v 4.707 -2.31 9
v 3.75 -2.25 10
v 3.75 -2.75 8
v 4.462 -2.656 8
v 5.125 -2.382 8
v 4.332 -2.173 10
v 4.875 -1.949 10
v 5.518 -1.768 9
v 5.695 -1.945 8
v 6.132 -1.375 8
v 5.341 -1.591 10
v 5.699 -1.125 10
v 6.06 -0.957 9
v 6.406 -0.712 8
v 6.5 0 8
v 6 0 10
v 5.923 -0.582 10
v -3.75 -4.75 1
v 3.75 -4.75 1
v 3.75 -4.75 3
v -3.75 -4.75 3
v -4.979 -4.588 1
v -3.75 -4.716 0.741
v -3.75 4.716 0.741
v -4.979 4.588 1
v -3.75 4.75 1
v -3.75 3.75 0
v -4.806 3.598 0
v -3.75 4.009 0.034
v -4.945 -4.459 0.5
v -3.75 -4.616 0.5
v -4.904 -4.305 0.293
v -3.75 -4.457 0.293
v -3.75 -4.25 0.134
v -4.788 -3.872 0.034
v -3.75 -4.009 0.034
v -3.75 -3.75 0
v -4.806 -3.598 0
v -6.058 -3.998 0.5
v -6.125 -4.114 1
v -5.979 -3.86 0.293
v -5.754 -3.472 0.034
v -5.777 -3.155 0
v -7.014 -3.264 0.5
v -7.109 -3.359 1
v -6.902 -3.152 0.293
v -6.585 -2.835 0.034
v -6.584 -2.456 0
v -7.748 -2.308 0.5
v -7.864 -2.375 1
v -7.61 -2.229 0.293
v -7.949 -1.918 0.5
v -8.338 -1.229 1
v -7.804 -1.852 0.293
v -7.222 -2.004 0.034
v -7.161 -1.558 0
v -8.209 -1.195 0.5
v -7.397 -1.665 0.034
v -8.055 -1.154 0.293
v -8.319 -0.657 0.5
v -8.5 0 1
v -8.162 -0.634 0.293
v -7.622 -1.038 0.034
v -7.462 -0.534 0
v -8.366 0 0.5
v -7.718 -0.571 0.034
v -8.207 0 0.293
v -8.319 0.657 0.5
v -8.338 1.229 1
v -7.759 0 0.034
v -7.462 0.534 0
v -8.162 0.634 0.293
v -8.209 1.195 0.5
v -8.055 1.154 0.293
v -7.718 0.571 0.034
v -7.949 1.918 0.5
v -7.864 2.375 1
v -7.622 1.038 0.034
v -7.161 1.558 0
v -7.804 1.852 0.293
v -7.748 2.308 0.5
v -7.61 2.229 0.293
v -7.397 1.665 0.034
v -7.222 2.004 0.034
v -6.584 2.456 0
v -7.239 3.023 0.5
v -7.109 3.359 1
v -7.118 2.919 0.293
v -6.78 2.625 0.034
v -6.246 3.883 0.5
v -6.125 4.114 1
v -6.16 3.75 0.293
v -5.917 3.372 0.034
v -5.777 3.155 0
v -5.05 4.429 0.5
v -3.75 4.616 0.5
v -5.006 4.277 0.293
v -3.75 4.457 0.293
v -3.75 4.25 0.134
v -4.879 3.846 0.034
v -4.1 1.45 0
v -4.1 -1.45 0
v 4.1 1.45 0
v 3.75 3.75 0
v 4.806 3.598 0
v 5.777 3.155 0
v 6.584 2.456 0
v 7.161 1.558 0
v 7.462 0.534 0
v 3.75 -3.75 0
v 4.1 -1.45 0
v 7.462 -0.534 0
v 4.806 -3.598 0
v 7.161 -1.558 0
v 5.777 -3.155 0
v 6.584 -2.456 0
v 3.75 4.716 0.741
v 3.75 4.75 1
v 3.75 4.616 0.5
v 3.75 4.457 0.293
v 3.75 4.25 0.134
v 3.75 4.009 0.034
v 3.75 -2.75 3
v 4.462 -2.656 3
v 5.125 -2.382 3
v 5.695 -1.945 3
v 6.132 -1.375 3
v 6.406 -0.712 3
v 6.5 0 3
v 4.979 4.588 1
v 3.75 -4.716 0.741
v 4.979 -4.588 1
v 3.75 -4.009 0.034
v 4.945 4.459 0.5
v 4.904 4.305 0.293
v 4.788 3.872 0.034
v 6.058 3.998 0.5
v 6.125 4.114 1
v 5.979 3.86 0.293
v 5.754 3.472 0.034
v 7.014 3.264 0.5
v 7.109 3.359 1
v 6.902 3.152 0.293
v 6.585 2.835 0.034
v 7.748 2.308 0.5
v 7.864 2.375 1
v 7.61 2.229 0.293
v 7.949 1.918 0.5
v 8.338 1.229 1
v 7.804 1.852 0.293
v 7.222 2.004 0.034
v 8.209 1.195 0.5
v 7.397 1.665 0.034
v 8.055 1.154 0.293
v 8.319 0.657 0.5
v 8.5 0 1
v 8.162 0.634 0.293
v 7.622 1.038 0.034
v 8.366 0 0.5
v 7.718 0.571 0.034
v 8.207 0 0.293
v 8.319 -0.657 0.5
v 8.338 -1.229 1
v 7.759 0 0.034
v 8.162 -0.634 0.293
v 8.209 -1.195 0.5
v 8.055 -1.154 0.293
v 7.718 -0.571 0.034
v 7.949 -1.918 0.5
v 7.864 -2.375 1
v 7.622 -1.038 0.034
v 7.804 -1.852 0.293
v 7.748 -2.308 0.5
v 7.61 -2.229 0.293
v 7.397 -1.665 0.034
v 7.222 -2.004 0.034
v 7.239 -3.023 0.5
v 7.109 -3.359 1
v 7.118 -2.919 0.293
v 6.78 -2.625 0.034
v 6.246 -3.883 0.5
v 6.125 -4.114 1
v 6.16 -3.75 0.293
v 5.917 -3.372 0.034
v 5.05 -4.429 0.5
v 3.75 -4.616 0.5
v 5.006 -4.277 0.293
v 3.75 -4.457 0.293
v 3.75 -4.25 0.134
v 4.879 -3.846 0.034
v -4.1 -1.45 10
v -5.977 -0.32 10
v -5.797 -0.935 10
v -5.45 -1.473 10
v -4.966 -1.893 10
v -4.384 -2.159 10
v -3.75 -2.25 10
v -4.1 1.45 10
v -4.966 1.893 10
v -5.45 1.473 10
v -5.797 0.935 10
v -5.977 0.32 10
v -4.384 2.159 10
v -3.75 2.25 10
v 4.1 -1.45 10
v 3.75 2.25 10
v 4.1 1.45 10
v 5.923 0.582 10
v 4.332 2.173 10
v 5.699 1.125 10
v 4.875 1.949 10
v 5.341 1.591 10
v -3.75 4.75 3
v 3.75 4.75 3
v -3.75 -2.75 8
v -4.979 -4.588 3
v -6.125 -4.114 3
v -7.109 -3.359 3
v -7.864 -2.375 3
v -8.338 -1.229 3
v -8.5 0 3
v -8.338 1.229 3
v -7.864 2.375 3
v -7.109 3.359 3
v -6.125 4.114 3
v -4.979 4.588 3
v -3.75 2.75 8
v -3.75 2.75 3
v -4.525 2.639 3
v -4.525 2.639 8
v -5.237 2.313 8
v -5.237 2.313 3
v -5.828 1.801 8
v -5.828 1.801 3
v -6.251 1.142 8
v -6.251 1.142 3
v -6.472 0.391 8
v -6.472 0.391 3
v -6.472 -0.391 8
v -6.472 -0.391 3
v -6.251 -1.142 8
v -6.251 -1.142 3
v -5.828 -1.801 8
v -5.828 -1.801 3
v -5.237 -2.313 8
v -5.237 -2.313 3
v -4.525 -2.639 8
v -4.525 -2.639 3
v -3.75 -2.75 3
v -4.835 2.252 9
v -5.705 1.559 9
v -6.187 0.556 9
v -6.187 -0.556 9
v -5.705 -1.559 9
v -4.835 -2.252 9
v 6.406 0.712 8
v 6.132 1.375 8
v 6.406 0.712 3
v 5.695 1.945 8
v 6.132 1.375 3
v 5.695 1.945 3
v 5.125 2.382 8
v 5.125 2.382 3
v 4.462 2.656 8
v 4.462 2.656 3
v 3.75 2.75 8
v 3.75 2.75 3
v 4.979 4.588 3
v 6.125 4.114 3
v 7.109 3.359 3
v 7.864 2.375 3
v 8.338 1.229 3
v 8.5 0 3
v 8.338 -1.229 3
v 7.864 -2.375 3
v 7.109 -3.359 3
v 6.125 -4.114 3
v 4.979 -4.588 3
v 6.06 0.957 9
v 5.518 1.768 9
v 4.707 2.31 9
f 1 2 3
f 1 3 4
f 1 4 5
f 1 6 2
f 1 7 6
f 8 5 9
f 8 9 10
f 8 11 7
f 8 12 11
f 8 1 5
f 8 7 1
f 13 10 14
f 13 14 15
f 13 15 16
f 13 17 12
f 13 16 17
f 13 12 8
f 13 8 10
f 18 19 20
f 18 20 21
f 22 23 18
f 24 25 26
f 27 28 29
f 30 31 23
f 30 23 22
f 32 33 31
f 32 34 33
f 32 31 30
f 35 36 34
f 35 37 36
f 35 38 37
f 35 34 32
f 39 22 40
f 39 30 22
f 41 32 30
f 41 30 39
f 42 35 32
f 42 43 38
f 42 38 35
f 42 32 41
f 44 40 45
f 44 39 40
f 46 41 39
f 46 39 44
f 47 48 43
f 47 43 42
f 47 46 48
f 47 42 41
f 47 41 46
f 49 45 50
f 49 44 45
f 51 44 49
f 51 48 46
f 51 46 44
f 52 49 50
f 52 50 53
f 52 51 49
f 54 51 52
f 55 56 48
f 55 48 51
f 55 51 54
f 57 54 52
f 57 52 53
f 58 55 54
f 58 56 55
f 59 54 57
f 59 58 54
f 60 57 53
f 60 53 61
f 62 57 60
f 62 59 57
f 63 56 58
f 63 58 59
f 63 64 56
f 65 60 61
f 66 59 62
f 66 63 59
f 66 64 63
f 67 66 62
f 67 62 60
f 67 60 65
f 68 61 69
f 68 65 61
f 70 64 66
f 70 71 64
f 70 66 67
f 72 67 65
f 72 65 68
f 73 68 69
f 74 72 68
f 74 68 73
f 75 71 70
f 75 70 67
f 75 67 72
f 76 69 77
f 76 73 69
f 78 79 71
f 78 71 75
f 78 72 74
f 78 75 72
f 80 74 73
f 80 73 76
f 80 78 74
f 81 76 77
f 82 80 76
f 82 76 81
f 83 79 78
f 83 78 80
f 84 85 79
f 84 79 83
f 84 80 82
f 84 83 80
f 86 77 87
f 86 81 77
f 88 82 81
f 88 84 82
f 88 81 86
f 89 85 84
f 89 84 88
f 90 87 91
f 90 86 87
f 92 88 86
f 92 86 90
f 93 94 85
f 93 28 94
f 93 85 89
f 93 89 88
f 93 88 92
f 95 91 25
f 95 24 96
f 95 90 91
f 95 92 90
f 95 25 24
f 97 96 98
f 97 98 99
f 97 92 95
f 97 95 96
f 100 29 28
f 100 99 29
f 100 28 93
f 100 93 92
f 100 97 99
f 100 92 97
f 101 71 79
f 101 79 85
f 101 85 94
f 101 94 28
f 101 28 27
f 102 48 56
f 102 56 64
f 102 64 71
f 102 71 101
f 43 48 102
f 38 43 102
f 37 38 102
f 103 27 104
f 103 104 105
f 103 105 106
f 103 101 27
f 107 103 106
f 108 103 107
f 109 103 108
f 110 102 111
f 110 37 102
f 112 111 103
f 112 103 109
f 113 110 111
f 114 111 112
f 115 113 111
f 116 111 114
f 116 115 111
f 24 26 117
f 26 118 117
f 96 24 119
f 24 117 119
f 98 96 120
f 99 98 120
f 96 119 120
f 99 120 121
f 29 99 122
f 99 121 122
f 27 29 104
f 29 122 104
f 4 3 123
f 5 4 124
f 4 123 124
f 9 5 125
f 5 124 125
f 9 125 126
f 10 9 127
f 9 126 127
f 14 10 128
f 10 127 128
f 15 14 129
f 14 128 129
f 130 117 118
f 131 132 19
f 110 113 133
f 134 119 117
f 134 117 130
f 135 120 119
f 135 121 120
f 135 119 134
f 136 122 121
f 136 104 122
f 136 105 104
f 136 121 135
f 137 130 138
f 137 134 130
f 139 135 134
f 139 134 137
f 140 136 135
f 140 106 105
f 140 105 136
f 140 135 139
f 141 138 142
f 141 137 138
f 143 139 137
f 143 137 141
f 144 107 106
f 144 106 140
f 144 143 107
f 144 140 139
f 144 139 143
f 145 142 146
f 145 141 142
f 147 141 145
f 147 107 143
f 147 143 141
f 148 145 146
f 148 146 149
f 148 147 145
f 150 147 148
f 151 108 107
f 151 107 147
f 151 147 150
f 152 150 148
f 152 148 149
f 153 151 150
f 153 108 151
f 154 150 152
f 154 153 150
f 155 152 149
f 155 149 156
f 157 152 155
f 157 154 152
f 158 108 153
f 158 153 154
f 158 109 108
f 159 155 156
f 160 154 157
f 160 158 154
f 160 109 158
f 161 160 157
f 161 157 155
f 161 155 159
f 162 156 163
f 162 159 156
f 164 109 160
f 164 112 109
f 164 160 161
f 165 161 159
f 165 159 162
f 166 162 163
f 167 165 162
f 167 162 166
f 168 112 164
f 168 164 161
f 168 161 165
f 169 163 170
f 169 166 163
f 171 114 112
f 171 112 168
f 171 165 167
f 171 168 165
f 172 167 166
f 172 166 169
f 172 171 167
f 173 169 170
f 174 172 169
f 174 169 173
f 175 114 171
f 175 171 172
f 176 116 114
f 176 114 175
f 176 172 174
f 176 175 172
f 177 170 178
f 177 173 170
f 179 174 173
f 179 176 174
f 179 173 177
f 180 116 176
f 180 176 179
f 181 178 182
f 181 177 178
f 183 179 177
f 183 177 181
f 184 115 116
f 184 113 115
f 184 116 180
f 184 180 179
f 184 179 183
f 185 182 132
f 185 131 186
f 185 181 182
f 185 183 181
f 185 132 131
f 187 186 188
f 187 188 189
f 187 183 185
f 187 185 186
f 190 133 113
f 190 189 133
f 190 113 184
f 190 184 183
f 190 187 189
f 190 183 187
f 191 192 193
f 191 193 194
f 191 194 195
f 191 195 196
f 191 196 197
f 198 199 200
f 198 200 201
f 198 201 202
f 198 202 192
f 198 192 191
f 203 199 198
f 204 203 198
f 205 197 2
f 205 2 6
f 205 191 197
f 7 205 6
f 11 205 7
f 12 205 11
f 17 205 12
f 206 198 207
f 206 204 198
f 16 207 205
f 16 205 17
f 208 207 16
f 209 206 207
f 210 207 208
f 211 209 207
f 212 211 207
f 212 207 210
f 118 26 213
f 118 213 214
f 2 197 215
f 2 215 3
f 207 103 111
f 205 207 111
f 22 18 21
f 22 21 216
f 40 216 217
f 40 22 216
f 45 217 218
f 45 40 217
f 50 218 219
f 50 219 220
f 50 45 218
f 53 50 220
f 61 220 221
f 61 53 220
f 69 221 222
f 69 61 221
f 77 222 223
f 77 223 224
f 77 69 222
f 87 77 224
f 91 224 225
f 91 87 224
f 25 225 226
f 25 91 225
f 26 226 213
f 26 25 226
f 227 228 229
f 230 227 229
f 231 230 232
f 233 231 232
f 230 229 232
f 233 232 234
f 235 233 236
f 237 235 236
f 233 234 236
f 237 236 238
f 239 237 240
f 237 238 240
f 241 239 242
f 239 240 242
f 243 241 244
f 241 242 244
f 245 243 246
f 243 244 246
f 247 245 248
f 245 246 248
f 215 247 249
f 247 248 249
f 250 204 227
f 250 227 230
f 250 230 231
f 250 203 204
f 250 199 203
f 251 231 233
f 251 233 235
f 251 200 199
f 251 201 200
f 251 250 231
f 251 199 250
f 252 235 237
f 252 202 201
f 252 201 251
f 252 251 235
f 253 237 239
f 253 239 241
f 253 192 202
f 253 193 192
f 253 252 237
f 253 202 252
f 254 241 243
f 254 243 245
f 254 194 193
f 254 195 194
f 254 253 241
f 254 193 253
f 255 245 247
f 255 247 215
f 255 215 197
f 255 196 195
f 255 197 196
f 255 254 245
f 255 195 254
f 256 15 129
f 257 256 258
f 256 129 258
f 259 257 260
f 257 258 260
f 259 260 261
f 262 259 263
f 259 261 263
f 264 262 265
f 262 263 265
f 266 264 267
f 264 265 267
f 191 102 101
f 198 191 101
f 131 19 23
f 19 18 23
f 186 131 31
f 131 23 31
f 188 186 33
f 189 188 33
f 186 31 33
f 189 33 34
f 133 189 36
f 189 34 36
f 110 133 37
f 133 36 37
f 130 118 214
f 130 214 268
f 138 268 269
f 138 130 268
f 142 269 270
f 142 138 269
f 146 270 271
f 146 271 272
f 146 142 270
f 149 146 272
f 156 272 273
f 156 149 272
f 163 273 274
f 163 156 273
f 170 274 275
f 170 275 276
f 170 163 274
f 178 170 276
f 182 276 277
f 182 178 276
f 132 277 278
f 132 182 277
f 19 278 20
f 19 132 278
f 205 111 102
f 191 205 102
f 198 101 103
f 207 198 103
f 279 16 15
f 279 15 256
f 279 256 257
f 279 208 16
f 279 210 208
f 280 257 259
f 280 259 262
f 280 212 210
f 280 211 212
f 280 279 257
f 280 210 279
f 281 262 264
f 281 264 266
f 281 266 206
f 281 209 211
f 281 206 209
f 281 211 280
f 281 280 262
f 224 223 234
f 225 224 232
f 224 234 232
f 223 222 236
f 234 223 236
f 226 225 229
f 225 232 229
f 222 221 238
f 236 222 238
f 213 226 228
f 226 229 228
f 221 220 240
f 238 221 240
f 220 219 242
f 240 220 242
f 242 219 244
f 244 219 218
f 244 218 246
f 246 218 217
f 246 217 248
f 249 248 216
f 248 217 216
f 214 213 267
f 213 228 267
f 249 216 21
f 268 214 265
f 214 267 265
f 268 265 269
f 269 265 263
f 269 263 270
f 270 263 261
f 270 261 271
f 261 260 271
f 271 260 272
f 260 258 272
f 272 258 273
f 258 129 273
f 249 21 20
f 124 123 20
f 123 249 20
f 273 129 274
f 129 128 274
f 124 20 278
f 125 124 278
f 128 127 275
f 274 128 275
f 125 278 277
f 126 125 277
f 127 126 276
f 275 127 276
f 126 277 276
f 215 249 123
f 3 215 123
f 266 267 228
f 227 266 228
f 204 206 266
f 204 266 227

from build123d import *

# Parameters (mm, degrees)
F1_DEPTH = 10
F2_SIZE2 = 0.5
F2_SIZE  = 2
F4_DEPTH = 3
F5_R     = 1


with BuildPart() as f1:
    # F0 (on Top) → F1 (new body)
    with BuildSketch(Plane.XY):
        with BuildLine():
            Line((3.75, 2.75), (-3.75, 2.75))
            ThreePointArc((-3.75, 2.75), (-2.4130258043, 2.4031229681), (-1.4133357109, 1.45))
            Line((-1.4133357109, 1.45), (1.4133357109, 1.45))
            ThreePointArc((1.4133357109, 1.45), (2.4130258043, 2.4031229681), (3.75, 2.75))
        make_face()
        with BuildLine():
            ThreePointArc((-1.4133357109, 1.45), (-2.4130258043, 2.4031229681), (-3.75, 2.75))
            ThreePointArc((-3.75, 2.75), (-6.5, 0), (-3.75, -2.75))
            ThreePointArc((-3.75, -2.75), (-2.4130258043, -2.4031229681), (-1.4133357109, -1.45))
            Line((-1.4133357109, -1.45), (-4.1, -1.45))
            Line((-4.1, -1.45), (-4.1, 1.45))
            Line((-4.1, 1.45), (-1.4133357109, 1.45))
        make_face()
        with BuildLine():
            ThreePointArc((6.5, 0), (5.6945436483, 1.9445436483), (3.75, 2.75))
            ThreePointArc((3.75, 2.75), (2.4130258043, 2.4031229681), (1.4133357109, 1.45))
            Line((1.4133357109, 1.45), (4.1, 1.45))
            Line((4.1, 1.45), (4.1, -1.45))
            Line((4.1, -1.45), (1.4133357109, -1.45))
            ThreePointArc((1.4133357109, -1.45), (2.4130258043, -2.4031229681), (3.75, -2.75))
            ThreePointArc((3.75, -2.75), (5.6945436483, -1.9445436483), (6.5, 0))
        make_face()
        with BuildLine():
            ThreePointArc((-1.4133357109, -1.45), (-2.4130258043, -2.4031229681), (-3.75, -2.75))
            Line((-3.75, -2.75), (3.75, -2.75))
            ThreePointArc((3.75, -2.75), (2.4130258043, -2.4031229681), (1.4133357109, -1.45))
            Line((1.4133357109, -1.45), (-1.4133357109, -1.45))
        make_face()
    extrude(amount=F1_DEPTH)

    # F2
    f2_edges = [f1.edges().sort_by_distance(p)[0] for p in [
        (0, -2.75, 10),
    ]]
    f2_side = f1.faces().sort_by_distance((0, -2.75, 5))[0]
    chamfer(f2_edges, length=F2_SIZE, length2=F2_SIZE2, reference=f2_side)

    # F3 (on face) → F4 (join)
    with BuildSketch(Plane(origin=(0, 0, 0), x_dir=(1, 0, 0), z_dir=(0, 0, -1))):
        with BuildLine():
            ThreePointArc((3.75, -4.75), (8.5, 0), (3.75, 4.75))
            Line((3.75, 4.75), (-3.75, 4.75))
            ThreePointArc((-3.75, 4.75), (-8.5, 0), (-3.75, -4.75))
            Line((-3.75, -4.75), (3.75, -4.75))
        make_face()
        with BuildLine():
            Line((3.75, -2.75), (-3.75, -2.75))
            ThreePointArc((-3.75, -2.75), (-6.5, 0), (-3.75, 2.75))
            Line((-3.75, 2.75), (3.75, 2.75))
            ThreePointArc((3.75, 2.75), (6.5, 0), (3.75, -2.75))
        make_face(mode=Mode.SUBTRACT)
    extrude(amount=-F4_DEPTH)

    # F5
    f5_edges = [f1.edges().sort_by_distance(p)[0] for p in [
        (0, -4.75, 0),
        (8.5, 0, 0),
        (0, 4.75, 0),
    ]]
    fillet(f5_edges, radius=F5_R)


solid = f1.part
